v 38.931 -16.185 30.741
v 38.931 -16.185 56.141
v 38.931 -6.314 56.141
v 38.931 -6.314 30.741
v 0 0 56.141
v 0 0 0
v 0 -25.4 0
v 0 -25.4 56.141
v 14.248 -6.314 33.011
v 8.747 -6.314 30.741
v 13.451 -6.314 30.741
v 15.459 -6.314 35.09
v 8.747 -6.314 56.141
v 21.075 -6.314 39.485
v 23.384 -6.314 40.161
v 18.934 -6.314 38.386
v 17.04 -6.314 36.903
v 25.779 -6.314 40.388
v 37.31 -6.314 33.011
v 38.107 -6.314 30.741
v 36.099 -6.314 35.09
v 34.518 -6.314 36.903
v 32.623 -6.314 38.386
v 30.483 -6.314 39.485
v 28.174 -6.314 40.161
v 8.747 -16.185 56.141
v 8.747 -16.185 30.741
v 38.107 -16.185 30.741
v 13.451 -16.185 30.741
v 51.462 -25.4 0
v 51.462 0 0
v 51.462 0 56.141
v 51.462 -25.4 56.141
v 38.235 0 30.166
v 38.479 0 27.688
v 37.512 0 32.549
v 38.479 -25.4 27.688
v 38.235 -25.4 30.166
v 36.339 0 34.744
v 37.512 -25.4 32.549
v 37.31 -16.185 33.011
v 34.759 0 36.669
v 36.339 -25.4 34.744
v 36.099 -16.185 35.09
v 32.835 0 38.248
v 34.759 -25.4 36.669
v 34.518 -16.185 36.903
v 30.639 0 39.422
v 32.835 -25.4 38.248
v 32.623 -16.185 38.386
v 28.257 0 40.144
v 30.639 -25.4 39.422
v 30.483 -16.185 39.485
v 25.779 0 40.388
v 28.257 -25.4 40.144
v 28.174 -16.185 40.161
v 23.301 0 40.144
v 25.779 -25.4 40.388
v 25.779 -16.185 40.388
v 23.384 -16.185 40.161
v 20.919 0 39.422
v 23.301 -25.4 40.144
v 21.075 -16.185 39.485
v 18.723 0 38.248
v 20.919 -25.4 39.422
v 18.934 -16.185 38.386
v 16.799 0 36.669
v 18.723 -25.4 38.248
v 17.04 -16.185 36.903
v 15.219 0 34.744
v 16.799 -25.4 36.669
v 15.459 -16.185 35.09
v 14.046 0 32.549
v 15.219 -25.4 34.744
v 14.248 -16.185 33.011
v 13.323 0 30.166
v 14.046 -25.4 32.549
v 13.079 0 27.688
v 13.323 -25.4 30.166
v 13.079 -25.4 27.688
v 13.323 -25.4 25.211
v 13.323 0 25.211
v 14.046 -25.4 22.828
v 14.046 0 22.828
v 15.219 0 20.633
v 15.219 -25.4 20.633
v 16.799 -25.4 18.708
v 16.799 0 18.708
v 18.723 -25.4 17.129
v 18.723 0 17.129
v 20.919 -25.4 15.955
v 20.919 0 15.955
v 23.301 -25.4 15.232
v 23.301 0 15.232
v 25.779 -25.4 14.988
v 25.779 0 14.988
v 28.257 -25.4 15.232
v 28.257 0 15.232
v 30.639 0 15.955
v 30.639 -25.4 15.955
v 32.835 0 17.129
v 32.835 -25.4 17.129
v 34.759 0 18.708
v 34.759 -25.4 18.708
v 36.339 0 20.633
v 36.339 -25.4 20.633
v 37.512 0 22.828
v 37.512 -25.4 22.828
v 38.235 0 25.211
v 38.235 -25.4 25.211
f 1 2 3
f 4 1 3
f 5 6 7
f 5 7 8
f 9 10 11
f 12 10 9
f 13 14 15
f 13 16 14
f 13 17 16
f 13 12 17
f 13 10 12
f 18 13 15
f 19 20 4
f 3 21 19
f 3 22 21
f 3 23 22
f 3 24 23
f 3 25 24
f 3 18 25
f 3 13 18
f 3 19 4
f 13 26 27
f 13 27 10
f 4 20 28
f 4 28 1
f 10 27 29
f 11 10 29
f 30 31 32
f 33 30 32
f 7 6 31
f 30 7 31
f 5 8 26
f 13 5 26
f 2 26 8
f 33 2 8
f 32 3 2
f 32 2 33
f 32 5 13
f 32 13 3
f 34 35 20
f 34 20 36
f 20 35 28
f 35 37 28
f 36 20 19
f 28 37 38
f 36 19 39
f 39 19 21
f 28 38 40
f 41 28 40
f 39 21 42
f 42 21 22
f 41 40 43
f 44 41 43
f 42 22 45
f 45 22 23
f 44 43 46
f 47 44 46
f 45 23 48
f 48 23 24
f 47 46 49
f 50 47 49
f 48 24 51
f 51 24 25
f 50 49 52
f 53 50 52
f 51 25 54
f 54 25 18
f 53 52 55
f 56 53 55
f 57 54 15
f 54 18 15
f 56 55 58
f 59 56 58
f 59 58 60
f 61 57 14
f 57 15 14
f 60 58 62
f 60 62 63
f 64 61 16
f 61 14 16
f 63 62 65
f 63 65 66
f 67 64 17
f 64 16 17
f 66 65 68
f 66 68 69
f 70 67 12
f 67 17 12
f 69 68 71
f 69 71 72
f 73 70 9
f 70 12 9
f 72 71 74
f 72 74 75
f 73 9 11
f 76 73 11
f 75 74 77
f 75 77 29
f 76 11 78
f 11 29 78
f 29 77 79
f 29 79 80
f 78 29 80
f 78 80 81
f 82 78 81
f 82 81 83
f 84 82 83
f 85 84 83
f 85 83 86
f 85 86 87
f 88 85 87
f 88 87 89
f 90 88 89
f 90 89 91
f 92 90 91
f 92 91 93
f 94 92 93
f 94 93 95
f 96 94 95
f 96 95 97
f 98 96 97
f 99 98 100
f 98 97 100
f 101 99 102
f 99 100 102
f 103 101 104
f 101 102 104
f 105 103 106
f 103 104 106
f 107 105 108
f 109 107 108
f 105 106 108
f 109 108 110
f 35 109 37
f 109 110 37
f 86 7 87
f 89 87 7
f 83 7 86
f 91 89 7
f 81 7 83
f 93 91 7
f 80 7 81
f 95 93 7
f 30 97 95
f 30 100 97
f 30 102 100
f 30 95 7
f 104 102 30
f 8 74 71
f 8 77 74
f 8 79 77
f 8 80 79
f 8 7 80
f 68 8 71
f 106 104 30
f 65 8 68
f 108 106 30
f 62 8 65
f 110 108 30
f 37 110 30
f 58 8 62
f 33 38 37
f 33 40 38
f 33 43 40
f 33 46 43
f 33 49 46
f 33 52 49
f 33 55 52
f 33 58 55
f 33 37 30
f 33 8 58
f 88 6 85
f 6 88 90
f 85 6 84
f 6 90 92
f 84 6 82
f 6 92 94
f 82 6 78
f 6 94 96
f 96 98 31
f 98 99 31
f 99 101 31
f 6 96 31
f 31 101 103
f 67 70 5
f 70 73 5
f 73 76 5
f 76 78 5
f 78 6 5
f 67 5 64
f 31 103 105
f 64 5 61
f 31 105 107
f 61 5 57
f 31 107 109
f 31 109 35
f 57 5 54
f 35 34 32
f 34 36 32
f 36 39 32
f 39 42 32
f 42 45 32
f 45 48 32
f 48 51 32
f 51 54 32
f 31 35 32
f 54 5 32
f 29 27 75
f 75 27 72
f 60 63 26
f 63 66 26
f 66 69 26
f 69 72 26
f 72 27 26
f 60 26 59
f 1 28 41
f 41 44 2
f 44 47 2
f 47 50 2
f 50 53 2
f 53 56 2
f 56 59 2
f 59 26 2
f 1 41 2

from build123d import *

# Parameters (mm, degrees)
F0_W     = 51.462281
F0_H     = 56.140669
F1_DEPTH = 25.4
F2_R     = 12.7
F3_DEPTH = 25.4
F4_W     = 30.184469
F4_H     = 9.87075
F5_DEPTH = 25.4


with BuildPart() as f1:
    # F0 (on Front) → F1 (new body)
    with BuildSketch(Plane.XZ):
        with Locations((25.73114, 28.070334)):
            Rectangle(F0_W, F0_H)
    extrude(amount=F1_DEPTH)

    # F2 (on face) → F3 (cut)
    with BuildSketch(Plane.XZ.offset(25.4)):
        with Locations((25.77888, 27.688427)):
            Circle(F2_R)
    extrude(amount=-F3_DEPTH, mode=Mode.SUBTRACT)

    # F4 (on face) → F5 (cut)
    with BuildSketch(Plane.XY.offset(56.140669)):
        with Locations((23.83924, -11.24981)):
            Rectangle(F4_W, F4_H)
    extrude(amount=-F5_DEPTH, mode=Mode.SUBTRACT)


solid = f1.part
